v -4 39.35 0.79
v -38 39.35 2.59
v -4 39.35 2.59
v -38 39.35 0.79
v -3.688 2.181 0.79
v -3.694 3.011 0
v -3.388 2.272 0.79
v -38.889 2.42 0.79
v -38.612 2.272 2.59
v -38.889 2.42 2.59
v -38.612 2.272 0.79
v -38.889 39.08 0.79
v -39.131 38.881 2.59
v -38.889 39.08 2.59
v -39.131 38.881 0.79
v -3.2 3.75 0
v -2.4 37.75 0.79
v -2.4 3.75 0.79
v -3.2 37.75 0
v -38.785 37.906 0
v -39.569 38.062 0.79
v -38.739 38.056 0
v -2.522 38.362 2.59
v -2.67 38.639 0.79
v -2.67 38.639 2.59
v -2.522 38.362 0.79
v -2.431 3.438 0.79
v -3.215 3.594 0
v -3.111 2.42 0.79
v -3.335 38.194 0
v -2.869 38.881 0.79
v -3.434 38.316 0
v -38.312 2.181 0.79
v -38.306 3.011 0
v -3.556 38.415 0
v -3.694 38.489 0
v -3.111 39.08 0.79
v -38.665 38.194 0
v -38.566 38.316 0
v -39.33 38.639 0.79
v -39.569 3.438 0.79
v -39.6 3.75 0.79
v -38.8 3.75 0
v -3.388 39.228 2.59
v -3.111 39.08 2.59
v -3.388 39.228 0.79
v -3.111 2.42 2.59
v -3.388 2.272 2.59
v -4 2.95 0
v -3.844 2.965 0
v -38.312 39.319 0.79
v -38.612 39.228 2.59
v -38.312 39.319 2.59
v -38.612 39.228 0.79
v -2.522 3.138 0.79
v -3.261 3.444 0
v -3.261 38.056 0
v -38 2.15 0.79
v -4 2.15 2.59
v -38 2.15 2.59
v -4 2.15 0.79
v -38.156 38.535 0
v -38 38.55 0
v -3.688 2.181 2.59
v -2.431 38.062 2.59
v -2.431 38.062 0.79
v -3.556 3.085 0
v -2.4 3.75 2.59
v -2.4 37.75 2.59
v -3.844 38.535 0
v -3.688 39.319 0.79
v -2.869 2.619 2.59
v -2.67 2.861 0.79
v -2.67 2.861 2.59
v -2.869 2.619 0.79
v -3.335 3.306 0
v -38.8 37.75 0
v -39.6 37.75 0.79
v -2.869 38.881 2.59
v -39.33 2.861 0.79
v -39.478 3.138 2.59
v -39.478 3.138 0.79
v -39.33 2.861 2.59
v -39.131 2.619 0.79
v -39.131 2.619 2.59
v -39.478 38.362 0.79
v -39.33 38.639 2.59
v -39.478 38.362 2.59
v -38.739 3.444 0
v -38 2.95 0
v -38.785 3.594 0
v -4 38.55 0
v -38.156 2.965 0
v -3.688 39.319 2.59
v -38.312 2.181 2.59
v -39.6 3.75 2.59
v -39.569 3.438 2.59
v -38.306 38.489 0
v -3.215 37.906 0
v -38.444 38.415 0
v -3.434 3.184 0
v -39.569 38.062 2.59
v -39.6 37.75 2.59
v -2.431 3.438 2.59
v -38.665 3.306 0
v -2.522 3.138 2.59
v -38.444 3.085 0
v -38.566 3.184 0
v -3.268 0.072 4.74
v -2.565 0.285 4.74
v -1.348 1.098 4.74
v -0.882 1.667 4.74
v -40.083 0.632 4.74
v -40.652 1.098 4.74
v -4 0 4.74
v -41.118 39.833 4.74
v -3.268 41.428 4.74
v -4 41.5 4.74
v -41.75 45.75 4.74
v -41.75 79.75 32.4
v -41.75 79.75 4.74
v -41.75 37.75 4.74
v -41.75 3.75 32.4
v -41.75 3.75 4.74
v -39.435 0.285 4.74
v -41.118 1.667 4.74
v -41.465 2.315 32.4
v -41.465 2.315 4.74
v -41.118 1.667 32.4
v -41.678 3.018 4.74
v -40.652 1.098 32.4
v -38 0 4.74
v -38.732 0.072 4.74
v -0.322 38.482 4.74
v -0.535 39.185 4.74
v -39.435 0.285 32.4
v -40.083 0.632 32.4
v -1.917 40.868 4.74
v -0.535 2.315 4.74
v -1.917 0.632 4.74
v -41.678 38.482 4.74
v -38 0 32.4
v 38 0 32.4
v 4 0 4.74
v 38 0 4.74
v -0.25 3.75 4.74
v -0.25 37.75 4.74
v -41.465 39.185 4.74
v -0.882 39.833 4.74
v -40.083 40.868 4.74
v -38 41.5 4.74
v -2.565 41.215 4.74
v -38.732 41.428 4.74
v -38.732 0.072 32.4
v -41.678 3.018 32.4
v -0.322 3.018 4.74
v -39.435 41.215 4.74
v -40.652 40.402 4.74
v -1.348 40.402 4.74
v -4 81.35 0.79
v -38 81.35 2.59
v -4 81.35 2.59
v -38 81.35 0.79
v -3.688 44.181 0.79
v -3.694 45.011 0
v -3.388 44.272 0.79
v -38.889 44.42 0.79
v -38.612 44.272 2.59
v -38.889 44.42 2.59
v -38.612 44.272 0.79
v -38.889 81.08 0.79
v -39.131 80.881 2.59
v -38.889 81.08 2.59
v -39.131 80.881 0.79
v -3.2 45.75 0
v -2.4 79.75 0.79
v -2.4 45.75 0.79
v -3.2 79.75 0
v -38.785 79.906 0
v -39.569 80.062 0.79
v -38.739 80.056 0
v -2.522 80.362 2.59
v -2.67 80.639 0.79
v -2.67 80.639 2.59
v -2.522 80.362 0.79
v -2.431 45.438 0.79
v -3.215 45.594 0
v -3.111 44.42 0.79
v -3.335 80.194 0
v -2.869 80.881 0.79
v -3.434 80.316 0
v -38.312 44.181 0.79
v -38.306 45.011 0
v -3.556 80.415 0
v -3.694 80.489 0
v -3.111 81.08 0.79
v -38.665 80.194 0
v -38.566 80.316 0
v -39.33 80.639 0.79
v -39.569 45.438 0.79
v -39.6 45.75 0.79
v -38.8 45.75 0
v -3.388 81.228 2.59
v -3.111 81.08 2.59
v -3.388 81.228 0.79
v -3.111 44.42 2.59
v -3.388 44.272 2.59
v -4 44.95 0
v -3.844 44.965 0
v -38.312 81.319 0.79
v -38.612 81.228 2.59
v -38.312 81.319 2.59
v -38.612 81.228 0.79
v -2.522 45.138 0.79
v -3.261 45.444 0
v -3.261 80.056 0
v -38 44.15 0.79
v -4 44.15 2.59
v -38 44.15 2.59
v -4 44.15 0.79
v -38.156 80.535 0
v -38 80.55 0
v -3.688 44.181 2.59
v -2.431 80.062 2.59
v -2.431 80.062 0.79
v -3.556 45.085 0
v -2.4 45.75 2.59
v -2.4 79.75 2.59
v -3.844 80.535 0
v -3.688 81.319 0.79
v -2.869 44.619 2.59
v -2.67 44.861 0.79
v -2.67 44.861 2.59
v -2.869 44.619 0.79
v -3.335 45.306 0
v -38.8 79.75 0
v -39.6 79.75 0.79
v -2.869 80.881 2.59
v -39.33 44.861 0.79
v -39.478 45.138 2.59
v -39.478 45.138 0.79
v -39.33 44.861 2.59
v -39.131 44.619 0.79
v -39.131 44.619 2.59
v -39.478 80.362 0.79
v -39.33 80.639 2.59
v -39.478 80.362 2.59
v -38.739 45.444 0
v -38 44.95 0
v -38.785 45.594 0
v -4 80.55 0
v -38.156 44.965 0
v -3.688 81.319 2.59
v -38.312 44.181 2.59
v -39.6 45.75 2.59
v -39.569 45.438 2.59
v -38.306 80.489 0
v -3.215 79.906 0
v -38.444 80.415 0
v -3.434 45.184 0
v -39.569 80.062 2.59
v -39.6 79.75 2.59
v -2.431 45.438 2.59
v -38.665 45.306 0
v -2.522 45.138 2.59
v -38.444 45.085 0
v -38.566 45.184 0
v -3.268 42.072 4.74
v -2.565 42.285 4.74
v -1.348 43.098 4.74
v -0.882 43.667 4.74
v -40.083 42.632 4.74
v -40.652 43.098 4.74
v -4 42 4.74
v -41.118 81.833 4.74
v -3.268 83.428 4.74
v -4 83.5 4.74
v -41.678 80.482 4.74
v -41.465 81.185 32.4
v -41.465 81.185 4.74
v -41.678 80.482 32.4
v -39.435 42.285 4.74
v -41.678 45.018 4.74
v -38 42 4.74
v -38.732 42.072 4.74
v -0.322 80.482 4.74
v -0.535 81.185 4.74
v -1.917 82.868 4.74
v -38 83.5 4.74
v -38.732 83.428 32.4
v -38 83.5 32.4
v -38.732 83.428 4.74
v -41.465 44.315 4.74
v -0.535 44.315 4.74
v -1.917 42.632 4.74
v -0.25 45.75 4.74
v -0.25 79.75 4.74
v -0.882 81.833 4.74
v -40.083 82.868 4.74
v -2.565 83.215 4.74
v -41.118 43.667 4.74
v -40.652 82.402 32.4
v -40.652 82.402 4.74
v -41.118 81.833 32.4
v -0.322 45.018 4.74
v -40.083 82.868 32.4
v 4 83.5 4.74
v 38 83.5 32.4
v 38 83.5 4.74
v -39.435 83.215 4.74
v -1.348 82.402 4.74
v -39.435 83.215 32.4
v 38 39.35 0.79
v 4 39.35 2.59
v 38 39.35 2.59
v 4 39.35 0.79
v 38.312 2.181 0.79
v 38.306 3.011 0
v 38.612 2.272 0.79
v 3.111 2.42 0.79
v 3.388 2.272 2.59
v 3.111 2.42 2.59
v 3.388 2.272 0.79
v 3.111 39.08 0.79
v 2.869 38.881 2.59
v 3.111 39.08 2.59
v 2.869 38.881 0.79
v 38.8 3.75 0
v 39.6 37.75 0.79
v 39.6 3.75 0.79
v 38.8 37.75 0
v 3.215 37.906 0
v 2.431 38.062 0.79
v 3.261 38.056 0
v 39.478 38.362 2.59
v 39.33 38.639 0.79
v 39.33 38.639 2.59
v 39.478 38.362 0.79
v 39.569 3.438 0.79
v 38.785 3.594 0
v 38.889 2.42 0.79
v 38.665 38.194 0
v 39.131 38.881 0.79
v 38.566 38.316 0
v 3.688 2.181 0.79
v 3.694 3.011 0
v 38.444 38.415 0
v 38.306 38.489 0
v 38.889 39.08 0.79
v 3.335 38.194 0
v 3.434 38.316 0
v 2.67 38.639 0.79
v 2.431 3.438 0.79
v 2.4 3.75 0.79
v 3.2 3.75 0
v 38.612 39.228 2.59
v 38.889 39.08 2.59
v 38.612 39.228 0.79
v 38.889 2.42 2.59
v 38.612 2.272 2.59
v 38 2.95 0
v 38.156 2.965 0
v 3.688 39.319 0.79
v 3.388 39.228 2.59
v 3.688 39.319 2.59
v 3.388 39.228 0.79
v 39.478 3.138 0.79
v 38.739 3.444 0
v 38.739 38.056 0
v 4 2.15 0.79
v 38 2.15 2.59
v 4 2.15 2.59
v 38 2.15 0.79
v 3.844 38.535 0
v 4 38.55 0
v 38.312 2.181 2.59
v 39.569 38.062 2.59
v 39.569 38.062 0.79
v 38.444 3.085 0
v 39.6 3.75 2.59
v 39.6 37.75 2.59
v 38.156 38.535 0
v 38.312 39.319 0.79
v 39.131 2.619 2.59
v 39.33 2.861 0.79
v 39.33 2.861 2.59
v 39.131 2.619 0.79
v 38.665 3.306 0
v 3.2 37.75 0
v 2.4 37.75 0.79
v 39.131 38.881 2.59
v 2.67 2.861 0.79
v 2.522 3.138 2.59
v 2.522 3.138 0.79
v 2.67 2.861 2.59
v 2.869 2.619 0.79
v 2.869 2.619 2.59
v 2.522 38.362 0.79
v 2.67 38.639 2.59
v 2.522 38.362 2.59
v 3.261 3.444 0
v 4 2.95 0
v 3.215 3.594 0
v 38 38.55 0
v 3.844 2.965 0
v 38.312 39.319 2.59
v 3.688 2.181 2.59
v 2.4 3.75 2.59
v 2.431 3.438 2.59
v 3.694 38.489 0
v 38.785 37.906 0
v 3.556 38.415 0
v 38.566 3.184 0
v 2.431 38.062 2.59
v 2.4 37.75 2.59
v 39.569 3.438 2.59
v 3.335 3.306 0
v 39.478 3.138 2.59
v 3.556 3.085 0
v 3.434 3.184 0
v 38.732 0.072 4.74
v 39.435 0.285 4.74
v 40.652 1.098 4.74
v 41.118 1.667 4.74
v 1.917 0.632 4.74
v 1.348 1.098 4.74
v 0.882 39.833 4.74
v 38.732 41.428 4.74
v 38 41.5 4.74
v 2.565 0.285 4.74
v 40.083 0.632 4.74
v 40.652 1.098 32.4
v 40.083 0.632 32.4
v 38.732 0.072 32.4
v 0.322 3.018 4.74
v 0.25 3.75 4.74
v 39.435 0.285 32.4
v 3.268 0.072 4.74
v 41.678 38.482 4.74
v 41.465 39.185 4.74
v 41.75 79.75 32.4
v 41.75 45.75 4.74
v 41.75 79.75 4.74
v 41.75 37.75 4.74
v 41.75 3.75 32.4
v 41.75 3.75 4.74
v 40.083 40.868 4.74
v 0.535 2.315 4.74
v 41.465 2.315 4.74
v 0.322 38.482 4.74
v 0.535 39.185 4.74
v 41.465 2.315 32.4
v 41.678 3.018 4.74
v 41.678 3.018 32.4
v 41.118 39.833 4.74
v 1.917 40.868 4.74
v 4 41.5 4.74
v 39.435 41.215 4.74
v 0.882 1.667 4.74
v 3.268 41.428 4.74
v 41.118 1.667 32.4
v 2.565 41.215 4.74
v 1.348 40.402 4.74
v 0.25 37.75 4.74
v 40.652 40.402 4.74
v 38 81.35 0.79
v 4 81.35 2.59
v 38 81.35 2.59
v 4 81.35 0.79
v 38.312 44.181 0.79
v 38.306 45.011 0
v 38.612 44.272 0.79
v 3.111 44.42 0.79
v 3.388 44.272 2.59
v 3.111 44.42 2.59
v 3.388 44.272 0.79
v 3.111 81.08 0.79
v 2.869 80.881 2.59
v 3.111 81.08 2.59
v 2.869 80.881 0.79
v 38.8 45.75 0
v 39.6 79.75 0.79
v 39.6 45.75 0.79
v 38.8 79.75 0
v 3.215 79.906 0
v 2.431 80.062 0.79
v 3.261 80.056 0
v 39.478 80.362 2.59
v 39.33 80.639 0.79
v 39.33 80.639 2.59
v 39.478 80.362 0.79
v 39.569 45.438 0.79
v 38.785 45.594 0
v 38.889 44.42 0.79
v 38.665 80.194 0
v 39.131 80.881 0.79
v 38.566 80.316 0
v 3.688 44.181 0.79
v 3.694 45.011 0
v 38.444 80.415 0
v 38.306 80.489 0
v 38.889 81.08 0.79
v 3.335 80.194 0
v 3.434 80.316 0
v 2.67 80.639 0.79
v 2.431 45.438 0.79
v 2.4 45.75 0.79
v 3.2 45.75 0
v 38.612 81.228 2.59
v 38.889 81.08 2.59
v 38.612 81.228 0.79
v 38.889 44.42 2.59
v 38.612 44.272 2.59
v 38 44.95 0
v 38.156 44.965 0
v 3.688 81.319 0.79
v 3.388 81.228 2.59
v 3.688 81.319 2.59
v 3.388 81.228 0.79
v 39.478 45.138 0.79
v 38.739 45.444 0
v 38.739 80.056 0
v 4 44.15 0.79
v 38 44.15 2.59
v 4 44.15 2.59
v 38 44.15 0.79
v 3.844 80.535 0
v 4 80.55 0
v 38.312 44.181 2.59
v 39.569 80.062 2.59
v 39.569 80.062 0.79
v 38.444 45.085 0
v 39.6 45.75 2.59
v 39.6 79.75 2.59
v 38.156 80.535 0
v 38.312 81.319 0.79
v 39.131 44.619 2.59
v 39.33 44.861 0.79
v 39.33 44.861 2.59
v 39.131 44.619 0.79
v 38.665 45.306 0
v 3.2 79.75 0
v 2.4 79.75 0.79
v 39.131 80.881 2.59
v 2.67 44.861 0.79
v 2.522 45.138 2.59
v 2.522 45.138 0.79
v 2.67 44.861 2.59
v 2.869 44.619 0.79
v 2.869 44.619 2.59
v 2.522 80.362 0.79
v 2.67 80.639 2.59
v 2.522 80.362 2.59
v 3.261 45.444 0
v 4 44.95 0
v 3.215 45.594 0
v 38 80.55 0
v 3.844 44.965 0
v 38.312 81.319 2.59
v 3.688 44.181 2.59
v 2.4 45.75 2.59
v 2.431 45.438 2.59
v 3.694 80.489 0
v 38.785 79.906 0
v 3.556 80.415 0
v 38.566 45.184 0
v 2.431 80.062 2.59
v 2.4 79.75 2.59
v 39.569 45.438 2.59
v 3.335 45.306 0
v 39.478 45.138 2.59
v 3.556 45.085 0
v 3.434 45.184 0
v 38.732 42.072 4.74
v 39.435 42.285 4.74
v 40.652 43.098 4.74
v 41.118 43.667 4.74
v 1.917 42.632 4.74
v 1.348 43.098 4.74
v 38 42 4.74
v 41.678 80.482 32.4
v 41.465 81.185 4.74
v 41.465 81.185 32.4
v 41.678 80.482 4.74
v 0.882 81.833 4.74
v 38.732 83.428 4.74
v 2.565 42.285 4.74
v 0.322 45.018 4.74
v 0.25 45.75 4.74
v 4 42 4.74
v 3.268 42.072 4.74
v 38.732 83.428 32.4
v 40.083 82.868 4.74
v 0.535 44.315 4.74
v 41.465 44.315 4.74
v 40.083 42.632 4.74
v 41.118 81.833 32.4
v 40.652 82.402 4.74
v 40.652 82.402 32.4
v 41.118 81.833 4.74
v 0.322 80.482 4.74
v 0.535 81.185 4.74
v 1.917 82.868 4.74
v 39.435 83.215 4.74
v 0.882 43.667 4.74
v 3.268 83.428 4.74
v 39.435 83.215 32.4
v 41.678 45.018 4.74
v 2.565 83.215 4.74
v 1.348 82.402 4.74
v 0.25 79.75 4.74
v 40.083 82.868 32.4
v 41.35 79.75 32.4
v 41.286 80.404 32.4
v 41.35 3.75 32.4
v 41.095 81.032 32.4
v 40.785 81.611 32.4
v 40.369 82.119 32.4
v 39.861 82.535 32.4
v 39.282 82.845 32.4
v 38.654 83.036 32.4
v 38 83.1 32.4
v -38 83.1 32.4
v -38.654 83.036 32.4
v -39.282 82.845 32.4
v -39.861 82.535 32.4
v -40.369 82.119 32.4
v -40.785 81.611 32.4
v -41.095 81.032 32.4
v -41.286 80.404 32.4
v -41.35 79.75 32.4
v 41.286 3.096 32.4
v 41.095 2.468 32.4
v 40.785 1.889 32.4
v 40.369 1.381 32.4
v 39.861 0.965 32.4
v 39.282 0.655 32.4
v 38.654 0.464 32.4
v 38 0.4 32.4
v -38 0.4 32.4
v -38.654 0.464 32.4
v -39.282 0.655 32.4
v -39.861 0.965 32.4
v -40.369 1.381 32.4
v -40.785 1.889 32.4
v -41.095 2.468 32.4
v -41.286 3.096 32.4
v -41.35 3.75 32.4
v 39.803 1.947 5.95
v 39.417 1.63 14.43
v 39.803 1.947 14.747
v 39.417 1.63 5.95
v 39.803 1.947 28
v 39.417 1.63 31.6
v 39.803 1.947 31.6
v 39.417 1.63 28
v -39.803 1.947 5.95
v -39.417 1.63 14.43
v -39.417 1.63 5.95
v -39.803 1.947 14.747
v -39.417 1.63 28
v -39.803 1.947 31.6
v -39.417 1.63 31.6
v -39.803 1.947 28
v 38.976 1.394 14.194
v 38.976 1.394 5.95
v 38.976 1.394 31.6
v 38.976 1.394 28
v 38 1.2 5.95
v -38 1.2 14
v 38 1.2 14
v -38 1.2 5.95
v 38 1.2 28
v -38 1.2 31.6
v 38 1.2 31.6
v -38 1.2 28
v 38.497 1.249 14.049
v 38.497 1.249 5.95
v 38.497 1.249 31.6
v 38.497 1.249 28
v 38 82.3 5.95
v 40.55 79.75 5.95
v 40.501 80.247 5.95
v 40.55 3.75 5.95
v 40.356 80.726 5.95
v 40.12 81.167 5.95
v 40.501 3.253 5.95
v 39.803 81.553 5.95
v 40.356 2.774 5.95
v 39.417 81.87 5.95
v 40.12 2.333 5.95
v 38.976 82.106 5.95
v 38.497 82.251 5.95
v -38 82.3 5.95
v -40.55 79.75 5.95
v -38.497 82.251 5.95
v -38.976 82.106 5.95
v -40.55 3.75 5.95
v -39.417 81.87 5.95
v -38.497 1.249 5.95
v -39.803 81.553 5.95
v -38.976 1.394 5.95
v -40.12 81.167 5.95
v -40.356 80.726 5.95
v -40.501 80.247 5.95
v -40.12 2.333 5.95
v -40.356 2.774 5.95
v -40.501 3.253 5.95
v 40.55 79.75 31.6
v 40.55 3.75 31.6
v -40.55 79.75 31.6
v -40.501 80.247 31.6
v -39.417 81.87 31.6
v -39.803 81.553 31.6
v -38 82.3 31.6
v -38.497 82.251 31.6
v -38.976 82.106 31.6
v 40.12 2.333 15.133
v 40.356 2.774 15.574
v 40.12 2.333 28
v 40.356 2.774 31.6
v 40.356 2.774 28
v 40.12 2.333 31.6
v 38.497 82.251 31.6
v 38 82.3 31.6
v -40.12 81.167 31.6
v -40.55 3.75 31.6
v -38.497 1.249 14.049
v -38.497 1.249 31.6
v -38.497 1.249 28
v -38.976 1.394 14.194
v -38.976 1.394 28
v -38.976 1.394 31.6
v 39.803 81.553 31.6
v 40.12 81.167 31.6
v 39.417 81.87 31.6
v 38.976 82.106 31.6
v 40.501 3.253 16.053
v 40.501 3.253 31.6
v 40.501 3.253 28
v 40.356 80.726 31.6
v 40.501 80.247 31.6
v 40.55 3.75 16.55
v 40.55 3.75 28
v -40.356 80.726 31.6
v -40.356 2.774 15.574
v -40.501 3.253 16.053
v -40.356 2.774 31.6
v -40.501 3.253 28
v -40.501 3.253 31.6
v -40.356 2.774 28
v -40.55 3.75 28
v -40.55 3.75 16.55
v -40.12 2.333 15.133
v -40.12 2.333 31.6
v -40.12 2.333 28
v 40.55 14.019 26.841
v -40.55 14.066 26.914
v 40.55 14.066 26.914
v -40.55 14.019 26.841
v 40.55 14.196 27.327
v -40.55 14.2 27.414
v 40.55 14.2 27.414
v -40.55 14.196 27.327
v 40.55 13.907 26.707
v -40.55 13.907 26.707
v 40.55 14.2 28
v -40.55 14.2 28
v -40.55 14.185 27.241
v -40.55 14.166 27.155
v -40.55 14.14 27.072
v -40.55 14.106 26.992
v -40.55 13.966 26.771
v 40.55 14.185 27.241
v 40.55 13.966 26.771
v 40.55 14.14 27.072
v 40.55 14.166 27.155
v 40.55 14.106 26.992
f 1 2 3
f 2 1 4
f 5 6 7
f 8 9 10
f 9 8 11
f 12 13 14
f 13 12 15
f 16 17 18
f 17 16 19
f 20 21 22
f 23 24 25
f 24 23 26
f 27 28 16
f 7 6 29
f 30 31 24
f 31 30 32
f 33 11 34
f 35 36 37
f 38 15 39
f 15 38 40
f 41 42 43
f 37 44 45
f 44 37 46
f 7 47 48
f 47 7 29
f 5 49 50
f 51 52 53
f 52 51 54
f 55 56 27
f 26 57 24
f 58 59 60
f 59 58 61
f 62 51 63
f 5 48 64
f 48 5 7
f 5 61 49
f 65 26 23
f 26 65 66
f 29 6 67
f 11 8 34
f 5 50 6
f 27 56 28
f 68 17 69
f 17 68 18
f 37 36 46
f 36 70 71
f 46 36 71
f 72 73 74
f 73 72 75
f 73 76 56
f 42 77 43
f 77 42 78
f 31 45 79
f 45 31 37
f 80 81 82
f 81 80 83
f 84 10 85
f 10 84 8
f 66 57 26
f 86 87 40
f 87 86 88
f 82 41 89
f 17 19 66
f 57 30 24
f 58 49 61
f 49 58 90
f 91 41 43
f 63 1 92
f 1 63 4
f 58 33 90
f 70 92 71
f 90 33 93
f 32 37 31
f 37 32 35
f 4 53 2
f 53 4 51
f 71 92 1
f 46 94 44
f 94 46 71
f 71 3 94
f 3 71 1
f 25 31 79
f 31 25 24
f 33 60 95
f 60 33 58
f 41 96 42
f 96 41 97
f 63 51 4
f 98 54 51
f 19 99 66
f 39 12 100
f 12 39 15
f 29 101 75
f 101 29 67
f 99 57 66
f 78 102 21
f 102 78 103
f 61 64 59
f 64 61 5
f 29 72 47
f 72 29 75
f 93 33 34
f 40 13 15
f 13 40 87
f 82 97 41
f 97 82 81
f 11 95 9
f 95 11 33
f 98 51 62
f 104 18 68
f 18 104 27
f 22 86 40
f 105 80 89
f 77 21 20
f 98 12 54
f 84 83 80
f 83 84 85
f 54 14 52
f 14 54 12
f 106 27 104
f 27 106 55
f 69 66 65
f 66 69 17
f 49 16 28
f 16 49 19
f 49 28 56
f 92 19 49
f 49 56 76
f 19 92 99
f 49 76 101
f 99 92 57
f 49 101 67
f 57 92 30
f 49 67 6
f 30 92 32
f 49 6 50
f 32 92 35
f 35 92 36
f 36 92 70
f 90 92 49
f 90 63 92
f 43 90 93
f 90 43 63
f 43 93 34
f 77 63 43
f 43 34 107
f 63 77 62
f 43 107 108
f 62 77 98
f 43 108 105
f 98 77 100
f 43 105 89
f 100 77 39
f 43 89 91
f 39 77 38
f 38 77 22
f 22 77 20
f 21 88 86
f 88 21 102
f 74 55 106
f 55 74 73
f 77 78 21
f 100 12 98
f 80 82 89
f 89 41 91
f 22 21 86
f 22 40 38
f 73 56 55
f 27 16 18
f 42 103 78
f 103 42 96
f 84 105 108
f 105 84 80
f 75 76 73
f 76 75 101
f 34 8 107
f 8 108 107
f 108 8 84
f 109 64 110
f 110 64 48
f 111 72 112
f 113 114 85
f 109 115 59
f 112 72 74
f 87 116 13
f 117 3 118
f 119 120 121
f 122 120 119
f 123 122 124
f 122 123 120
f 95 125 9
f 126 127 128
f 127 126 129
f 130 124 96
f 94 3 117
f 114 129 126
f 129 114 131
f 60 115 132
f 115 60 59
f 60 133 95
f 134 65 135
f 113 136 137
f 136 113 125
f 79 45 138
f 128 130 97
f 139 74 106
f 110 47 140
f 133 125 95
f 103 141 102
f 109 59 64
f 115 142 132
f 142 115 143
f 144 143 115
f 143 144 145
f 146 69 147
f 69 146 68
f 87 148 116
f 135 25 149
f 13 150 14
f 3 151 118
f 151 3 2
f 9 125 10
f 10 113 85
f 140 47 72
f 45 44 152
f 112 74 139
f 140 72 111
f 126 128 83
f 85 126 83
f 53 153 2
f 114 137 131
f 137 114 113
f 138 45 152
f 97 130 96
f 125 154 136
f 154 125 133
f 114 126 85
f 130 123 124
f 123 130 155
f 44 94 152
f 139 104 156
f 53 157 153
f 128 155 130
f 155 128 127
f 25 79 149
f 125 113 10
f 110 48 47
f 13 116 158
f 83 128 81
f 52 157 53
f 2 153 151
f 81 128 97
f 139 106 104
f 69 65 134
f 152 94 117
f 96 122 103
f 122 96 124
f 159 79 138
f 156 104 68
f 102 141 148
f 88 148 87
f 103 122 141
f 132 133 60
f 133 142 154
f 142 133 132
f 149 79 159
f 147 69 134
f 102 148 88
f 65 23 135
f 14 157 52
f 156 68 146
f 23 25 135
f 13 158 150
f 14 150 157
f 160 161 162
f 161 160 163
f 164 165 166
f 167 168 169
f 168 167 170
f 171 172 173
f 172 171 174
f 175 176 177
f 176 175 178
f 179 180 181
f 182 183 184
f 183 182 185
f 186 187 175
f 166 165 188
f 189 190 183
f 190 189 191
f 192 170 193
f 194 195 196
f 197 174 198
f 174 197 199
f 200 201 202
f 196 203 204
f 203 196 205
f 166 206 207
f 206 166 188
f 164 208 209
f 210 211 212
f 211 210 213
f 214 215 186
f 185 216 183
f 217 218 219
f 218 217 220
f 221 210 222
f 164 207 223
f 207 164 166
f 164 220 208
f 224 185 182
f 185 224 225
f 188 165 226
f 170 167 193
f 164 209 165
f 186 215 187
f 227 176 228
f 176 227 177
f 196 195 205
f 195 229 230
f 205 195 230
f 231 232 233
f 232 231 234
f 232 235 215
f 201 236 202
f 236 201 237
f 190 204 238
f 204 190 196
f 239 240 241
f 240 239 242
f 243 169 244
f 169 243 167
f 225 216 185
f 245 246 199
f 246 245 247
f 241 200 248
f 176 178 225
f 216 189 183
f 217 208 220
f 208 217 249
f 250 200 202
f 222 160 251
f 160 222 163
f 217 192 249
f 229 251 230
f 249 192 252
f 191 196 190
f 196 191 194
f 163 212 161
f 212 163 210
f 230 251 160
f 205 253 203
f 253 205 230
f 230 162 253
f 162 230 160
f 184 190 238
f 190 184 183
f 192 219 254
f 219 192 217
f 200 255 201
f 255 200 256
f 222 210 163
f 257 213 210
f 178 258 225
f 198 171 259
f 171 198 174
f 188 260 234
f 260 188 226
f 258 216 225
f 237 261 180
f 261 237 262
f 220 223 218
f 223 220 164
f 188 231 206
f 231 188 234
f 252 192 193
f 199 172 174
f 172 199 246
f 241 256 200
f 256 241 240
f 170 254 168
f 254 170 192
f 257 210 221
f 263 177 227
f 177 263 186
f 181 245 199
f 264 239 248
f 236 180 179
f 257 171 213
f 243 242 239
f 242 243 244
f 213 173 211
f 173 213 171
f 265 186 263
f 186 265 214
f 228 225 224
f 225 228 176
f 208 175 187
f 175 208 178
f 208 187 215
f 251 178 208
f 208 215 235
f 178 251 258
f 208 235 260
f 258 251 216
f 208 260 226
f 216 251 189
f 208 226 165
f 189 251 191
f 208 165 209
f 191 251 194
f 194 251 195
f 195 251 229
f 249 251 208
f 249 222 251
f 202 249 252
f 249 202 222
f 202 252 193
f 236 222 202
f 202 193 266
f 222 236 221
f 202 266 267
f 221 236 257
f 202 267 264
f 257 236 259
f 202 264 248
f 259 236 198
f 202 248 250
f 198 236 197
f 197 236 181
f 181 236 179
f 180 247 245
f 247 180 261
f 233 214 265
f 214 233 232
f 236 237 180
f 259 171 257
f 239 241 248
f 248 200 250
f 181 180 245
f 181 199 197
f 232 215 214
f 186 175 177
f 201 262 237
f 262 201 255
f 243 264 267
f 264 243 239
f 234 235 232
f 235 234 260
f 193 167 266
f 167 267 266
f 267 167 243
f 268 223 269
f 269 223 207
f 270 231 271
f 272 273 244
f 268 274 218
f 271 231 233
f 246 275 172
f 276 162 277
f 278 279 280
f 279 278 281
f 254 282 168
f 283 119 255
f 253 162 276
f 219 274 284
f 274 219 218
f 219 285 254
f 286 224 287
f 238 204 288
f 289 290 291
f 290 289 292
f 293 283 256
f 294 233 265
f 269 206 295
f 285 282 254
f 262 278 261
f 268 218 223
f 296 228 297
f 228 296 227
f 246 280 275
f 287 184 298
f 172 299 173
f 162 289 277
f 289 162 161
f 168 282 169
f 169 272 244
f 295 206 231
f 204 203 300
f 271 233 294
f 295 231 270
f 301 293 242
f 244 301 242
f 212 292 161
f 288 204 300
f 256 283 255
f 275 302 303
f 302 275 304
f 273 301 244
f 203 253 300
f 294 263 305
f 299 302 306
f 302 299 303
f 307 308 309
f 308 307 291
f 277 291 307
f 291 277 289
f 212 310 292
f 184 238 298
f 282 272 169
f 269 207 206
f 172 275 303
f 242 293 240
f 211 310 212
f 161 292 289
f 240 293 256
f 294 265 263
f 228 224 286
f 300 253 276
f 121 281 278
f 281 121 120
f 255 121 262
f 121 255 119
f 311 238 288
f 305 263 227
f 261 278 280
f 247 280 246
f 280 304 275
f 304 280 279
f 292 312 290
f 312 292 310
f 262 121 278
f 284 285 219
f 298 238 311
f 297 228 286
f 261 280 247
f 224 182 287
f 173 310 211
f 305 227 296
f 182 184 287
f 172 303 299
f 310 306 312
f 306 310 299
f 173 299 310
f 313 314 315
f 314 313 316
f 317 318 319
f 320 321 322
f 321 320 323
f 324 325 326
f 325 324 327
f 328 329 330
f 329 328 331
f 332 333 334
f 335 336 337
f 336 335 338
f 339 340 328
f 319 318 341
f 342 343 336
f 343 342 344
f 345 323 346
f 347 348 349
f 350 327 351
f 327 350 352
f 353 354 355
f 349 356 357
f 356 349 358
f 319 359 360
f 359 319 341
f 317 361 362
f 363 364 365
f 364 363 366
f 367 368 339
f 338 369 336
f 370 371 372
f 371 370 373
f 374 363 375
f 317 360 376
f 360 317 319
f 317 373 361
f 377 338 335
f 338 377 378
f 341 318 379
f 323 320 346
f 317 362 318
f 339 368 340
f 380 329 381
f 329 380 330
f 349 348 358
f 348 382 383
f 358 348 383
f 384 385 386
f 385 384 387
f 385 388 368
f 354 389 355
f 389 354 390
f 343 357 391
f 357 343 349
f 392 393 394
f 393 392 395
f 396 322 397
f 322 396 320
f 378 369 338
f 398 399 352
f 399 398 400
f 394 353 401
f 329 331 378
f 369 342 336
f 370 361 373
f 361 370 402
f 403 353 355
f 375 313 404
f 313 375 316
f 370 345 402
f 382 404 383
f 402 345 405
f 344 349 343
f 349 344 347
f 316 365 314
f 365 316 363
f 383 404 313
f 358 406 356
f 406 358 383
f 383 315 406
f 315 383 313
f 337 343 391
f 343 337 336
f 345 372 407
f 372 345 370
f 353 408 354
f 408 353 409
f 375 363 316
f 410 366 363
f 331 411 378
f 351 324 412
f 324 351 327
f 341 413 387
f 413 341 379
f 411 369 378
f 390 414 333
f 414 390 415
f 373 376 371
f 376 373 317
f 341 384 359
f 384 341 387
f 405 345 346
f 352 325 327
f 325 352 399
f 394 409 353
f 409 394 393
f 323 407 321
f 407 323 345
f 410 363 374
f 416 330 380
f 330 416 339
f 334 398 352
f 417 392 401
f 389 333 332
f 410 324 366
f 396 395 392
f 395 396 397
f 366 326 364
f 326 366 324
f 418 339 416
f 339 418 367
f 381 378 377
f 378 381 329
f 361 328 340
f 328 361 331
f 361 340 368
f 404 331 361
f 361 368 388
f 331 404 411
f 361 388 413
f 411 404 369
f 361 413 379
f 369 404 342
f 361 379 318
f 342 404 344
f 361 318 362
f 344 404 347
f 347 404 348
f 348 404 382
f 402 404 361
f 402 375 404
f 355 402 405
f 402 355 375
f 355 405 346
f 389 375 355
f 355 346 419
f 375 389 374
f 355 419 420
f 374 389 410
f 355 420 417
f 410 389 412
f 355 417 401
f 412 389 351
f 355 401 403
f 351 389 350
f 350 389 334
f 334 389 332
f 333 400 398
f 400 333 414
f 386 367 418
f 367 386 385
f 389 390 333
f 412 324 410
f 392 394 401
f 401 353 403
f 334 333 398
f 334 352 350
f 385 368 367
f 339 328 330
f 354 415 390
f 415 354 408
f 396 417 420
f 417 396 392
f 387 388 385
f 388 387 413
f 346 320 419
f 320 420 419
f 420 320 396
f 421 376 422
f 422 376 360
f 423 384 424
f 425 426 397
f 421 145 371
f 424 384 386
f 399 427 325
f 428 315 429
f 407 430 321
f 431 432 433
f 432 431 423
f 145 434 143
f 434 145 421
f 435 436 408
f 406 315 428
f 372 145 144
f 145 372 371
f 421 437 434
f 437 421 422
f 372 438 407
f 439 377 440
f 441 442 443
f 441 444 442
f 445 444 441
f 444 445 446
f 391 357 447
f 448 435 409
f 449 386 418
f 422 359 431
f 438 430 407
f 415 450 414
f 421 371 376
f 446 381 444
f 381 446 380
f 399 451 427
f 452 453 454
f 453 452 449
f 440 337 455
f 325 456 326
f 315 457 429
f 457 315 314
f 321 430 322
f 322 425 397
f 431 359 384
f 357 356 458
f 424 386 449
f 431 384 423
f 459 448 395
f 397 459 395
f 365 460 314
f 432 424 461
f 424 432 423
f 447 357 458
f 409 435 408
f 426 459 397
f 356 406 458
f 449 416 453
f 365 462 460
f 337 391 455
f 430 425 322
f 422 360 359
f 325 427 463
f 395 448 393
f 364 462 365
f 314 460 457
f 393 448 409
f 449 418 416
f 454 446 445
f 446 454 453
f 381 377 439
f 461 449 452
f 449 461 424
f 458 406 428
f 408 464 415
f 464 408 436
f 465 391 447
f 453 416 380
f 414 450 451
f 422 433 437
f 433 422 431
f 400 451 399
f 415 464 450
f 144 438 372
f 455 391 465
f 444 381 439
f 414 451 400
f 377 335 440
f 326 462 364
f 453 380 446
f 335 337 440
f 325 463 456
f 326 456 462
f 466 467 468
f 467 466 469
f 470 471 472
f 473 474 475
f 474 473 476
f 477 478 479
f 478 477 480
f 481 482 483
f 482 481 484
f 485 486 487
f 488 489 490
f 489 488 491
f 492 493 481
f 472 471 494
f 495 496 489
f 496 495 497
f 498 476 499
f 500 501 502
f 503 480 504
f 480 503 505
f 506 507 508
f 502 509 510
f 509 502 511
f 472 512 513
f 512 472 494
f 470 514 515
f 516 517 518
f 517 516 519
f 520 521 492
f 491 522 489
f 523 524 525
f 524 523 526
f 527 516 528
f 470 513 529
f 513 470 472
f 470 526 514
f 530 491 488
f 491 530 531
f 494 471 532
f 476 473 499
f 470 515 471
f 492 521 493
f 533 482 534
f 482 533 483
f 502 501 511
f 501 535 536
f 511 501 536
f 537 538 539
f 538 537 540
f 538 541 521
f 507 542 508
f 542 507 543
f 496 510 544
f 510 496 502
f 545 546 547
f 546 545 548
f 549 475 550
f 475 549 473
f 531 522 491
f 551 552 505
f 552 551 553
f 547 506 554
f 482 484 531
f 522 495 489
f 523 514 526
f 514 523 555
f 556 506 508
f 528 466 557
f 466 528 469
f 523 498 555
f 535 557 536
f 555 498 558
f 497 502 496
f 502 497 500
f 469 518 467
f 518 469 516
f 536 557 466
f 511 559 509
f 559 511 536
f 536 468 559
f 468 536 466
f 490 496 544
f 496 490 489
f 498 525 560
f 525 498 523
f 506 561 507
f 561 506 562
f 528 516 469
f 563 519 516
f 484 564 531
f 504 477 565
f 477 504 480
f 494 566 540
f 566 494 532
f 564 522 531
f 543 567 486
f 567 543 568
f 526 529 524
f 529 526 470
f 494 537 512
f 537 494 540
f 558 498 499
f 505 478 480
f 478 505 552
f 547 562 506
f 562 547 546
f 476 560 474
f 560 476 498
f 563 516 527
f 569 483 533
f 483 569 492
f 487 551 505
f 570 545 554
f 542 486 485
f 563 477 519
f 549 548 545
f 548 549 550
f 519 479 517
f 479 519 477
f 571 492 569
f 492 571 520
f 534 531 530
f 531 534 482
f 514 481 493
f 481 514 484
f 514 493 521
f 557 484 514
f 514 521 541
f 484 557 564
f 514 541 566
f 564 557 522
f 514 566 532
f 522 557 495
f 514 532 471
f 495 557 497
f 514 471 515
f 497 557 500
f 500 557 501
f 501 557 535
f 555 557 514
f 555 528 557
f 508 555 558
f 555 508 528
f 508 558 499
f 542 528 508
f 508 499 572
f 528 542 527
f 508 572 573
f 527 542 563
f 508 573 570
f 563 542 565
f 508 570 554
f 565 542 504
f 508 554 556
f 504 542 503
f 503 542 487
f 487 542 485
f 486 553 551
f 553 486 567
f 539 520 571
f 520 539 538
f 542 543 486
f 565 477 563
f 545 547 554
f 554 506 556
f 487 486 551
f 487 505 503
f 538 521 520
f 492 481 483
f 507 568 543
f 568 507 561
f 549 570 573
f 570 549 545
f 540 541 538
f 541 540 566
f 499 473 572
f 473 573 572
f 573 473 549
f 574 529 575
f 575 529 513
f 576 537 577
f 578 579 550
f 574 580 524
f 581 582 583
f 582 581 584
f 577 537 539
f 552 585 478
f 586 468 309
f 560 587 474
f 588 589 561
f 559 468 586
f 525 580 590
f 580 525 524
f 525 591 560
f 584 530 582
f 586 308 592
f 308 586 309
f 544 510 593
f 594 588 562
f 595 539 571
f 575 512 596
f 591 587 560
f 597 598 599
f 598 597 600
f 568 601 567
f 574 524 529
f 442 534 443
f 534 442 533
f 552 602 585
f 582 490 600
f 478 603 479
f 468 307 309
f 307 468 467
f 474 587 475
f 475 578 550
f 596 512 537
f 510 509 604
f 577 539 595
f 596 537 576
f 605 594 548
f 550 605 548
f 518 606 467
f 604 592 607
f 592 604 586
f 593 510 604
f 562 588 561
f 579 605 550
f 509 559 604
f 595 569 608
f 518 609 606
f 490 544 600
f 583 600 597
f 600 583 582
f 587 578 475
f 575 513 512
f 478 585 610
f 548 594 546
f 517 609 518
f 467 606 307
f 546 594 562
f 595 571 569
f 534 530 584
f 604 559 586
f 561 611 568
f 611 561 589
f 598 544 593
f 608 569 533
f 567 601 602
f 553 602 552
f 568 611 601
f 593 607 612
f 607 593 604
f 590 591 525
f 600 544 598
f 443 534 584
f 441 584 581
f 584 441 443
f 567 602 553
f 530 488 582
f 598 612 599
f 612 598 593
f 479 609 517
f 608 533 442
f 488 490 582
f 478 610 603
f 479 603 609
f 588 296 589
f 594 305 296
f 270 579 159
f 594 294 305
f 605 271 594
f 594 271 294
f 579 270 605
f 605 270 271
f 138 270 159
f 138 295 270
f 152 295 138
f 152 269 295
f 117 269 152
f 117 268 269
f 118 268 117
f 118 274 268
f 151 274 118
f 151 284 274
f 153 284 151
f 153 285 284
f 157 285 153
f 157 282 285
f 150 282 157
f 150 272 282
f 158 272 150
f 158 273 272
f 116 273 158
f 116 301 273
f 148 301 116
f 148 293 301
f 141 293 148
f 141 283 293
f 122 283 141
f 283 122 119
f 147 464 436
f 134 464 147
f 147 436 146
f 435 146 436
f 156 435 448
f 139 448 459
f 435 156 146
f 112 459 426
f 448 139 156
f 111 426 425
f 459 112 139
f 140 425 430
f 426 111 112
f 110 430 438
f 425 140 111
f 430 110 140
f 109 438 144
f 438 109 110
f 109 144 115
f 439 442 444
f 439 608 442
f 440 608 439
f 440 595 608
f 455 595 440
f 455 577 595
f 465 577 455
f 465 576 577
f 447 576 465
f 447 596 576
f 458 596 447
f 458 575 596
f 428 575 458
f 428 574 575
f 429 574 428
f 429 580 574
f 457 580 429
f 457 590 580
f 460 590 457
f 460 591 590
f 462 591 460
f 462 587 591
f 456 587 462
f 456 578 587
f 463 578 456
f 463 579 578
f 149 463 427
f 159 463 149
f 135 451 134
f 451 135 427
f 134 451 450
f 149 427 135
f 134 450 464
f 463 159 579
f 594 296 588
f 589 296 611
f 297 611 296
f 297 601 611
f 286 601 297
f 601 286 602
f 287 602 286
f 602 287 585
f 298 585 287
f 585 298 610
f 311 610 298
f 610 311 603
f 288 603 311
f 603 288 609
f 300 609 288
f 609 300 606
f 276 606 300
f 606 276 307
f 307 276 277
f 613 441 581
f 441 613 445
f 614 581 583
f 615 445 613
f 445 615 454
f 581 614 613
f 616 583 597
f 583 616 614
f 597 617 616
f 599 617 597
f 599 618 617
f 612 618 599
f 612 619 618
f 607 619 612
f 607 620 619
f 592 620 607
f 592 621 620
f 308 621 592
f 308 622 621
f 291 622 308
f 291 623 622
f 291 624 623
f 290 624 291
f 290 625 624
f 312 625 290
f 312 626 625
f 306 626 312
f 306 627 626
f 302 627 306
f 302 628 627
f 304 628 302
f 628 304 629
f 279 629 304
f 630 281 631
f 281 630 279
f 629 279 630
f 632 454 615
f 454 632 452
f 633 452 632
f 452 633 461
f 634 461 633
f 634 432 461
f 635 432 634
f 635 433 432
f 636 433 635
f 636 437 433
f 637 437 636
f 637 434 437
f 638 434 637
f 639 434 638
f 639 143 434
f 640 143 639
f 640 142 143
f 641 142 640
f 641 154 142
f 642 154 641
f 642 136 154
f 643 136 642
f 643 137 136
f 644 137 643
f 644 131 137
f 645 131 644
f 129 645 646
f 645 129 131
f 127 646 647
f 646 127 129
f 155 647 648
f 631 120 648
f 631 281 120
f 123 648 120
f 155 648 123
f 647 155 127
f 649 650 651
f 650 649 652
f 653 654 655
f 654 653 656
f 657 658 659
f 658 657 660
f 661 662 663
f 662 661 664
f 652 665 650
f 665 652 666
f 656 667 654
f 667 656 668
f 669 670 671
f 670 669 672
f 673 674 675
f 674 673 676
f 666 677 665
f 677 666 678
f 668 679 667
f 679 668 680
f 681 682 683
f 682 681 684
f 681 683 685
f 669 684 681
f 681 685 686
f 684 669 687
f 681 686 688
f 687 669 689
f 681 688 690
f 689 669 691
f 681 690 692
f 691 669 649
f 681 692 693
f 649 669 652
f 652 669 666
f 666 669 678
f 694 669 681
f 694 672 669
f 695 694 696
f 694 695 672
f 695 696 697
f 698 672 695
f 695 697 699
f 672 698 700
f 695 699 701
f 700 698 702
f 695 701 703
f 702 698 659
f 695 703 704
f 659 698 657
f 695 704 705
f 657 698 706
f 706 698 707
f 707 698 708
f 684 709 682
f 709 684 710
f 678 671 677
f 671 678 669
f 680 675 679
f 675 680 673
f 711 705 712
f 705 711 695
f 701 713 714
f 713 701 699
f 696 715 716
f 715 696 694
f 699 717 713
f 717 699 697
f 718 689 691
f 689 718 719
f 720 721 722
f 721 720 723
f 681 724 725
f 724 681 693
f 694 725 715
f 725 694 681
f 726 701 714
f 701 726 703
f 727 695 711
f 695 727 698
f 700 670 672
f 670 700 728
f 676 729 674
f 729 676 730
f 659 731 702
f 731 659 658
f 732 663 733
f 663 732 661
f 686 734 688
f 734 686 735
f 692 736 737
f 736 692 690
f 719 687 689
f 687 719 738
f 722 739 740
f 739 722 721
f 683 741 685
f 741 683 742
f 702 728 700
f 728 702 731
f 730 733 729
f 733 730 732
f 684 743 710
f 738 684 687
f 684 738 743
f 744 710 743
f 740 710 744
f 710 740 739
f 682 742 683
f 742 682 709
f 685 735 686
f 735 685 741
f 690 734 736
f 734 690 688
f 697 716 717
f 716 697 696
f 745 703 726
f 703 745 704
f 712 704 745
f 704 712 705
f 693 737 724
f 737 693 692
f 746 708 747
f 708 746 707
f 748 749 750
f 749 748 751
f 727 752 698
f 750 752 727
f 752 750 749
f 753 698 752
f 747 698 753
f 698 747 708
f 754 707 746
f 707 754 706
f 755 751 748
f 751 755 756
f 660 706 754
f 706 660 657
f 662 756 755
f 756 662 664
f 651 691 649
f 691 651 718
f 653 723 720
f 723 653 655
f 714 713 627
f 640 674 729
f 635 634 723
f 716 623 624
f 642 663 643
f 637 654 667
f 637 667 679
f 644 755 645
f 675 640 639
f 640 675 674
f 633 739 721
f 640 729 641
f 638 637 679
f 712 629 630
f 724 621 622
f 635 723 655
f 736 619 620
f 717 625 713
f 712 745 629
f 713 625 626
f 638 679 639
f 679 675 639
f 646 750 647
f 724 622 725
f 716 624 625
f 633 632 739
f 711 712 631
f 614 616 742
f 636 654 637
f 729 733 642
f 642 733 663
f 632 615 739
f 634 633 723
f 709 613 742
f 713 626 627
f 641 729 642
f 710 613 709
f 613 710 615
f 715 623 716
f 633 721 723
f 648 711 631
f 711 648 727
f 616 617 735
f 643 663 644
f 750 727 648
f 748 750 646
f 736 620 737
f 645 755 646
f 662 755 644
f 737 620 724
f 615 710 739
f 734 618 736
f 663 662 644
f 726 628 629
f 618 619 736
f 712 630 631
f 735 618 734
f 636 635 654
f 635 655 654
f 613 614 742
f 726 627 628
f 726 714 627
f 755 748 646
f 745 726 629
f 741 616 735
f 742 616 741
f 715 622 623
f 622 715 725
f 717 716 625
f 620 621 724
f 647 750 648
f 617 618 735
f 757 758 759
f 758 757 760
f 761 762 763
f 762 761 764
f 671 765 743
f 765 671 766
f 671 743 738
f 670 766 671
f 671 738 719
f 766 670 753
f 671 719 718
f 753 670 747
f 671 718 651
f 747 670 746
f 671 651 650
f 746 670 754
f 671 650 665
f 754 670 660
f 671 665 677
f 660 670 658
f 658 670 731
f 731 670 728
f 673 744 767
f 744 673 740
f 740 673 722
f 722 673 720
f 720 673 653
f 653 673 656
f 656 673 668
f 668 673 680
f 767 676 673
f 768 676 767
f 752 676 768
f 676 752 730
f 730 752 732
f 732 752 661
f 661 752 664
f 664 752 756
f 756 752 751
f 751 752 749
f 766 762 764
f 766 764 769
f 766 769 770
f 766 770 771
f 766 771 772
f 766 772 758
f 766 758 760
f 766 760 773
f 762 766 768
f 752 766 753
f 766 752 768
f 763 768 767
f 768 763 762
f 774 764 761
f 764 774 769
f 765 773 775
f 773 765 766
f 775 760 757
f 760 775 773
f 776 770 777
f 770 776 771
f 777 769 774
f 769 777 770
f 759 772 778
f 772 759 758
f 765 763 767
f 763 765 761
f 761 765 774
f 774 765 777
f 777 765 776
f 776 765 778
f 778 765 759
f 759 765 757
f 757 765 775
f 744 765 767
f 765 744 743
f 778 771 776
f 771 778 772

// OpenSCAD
// file: ../../../modules/gridfinity.scad
// Gridfinity ベースプレートの共有 module。
// 寸法は Gridfinity 仕様 (Zack Freedman) の baseplate 輪郭に従う:
//   ピッチ 42、ソケット上端開口 41.5 (角 R4)、上から 45° 面取り 2.15 →
//   垂直 1.8 (37.2 角・R1.85) → 45° 面取り 0.7 → 底 35.8 角 (R1.15)。
//   ソケット深さ = 2.15 + 1.8 + 0.7 = 4.65。
//
// 座標系: X が列方向 (中央が 0)、Y が行方向 (板の前端が 0)、Z=0 が板の底面。
// 板の外形は grid とは独立に rim で与えるので、grid より大きい板 (縁付き) を
// 作れる。ソケットは rim=[left, right, front, back] の内側へ 42 ピッチで並ぶ。

gf_pitch = 42;
gf_socket_top = 41.5; // 上端開口
gf_socket_mid = 37.2; // 垂直部
gf_socket_bot = 35.8; // 底
gf_socket_r_top = 4;
gf_socket_r_mid = 1.85;
gf_socket_r_bot = 1.15;
gf_chamfer_top = 2.15;
gf_wall_h = 1.8;
gf_chamfer_bot = 0.7;
gf_socket_depth = gf_chamfer_top + gf_wall_h + gf_chamfer_bot; // 4.65
gf_fn = 32;
gf_eps = 0.01; // hull 用の薄板の厚さ
gf_over = 0.5; // 切削の抜き代

// 角丸正方形または矩形 (w は一辺、または [幅, 奥行き]、角 R)
module
gf_rounded_square(w, r)
{
    offset(r = r, $fn = gf_fn)
        square(is_list(w) ? w - [ 2 * r, 2 * r ] : w - 2 * r, center = true);
}

// 厚さ gf_eps の角丸正方形の薄板を z に置く (hull の骨)
module
gf_slab(w, r, z)
{
    translate([ 0, 0, z ]) linear_extrude(gf_eps) gf_rounded_square(w, r);
}

// ソケット1個の切削体。z=0 がソケットの底 (床の天面)、+Z へ 4.65 で天面に出る。
// clearance は嵌合の逃げで、輪郭を全周へ clearance だけ外へ出す (幅 +2c、角 R
// +c)。pitch_x は X 方向のセル幅。端数でも角 R と面取りの寸法を保つ。
module
gf_socket_cut(clearance = 0, pitch_x = gf_pitch)
{
    z1 = gf_chamfer_bot;
    z2 = z1 + gf_wall_h;
    z3 = gf_socket_depth;
    c = clearance;
    assert(pitch_x > gf_pitch - gf_socket_top + 2 * gf_socket_r_top,
           "Cell width is too small for the socket corner radius");
    delta = [ pitch_x - gf_pitch, 0 ];
    bot = [ gf_socket_bot + 2 * c, gf_socket_bot + 2 * c ] + delta;
    mid = [ gf_socket_mid + 2 * c, gf_socket_mid + 2 * c ] + delta;
    top = [ gf_socket_top + 2 * c, gf_socket_top + 2 * c ] + delta;
    hull()
    {
        gf_slab(bot, gf_socket_r_bot + c, 0);
        gf_slab(mid, gf_socket_r_mid + c, z1 - gf_eps);
    }
    hull()
    {
        gf_slab(mid, gf_socket_r_mid + c, z1 - gf_eps);
        gf_slab(mid, gf_socket_r_mid + c, z2 - gf_eps);
    }
    hull()
    {
        gf_slab(mid, gf_socket_r_mid + c, z2 - gf_eps);
        gf_slab(top, gf_socket_r_top + c, z3 - gf_eps);
    }
    // 天面より上へ抜く (天面と同一平面の退化した面を残さない)
    gf_slab(top, gf_socket_r_top + c, z3 - gf_eps);
    translate([ 0, 0, z3 - gf_eps ]) linear_extrude(gf_over + gf_eps)
        gf_rounded_square(top, gf_socket_r_top + c);
}

// ベースプレート。cols x rows のソケットを床 floor_t の上に彫る。
// rim = [left, right, front, back] はソケット列の外側に残す縁の幅。
// 板の幅 = cols*42 + left + right、奥行き = rows*42 + front + back。
// cols の端数は左端の細幅セルになる。rows は正の整数。
// clearance はソケットの嵌合の逃げ (gf_socket_cut を参照)。
module
gf_baseplate(cols, rows, rim = [ 0, 0, 0, 0 ], floor_t = 1, clearance = 0)
{
    grid_w = cols * gf_pitch;
    grid_d = rows * gf_pitch;
    plate_w = grid_w + rim[0] + rim[1];
    plate_d = grid_d + rim[2] + rim[3];
    x0 = -plate_w / 2 + rim[0]; // ソケット列の左端
    first_pitch = grid_w - (ceil(cols) - 1) * gf_pitch;
    difference()
    {
        translate([ -plate_w / 2, 0, 0 ])
            cube([ plate_w, plate_d, floor_t + gf_socket_depth ]);
        for (c = [0:ceil(cols) - 1], r = [0:rows - 1])
            translate([
                x0 + (c == 0 ? first_pitch / 2
                             : first_pitch + (c - 0.5) * gf_pitch),
                rim[2] + (r + 0.5) * gf_pitch,
                floor_t
            ]) gf_socket_cut(clearance, c == 0 ? first_pitch : gf_pitch);
    }
}
// file: ../../../modules/gridfinity_bins.scad
include <gridfinity_bin.scad>

// assets/gridfinity-bin/ の bin 群の共通値と、サイズ 3 引数の払い出し口。
// 単体では何も描かない。設計の経緯と確定値は
// ledger/designs/gridfinity-bin-4u.md が正本。
// 通常binは4U/9U、X={1,1.5,2,2.5,3} × Y={1,2,3,4,5,5.5}。
// 両軸に端数を持つ組み合わせはassetに置かない（各高さ28種）。
// Xが横、Yがラベルの壁から奥、unitsが高さ（7mm単位）。
wall = 1.2;    // 0.4 ノズル 3 本
floor_t = 1.2; // 底 (4.75) の上に載せる床。床の天面 z = 5.95
label_d = 13;  // 12mm 幅のラベルシールを貼る天板の張り出し
label_t = 1; // 天板の厚さ (user 指定)。下は 45° の無垢のくさび
label_r = 1; // 天板の先端と 45° 面の境目の R (user 指定)
// カードケース (goods/card_case_2x3x4u.scad) の値。カードは ISO/IEC 7810 ID-1 (85.6 × 54 ×
// 0.76、隅 R3) で、長辺を Y (rows 方向) に寝かせ、X 中央・手前の壁から 10 奥に置く。ポケットは
// カードより 1 大きい (片側 0.5)。右奥のマスは壁の内面まで抜き、床と底を外形に平行な 45° の窪みにする。
// ポケットの左右の埋めの天面 (幅 13.05) が 12mm のラベルを貼る帯。ポケットと穴の交点の
// 縦エッジは丸める (開口の上縁は丸めない: 壁を上端まで垂直に保ち、収まる枚数を減らさない)
card_w = 54;    // カードの短辺 (X)。user 指定「高さ 54」
card_d = 85.6;  // カードの長辺 (Y)。user 指定「幅 85.6」
card_clear = 1; // ポケットの余裕 (user 指定「+1mm」)
// ポケットの手前の辺の、手前の壁の内面からの距離 (user 指定「10mm」)
card_off = 10;
// ポケットの平面の隅 R (user 指定「角の丸み 3mm」。ID-1 の隅は 2.88..3.48)
card_r = 3;
// ポケットと穴が交わる所の、埋めの凸の縦エッジの R (指の当たる角)
card_edge_r = 2;
recess_skin = floor_t + 1.75; // 窪みの床 z (底の皮)。user 指定「壁厚と同じ 1.2 は過剰、1.75 返す」

function bin_contract(cols, rows, units) = str("CONTRACT units=",
                                               units,
                                               " pitch=",
                                               gf_pitch,
                                               " outer=",
                                               gfb_outer,
                                               " h=",
                                               units* gfb_unit,
                                               " lip=",
                                               gfb_lip_h,
                                               " base=",
                                               gfb_base_bot,
                                               "/",
                                               gfb_base_mid,
                                               "/",
                                               gfb_outer,
                                               " base_h=",
                                               gfb_base_h,
                                               " wall=",
                                               wall,
                                               " floor_top=",
                                               gfb_base_h + floor_t,
                                               " label=",
                                               label_d,
                                               "x",
                                               label_t,
                                               " wedge=45 fillet=",
                                               label_r,
                                               " bin=",
                                               cols,
                                               "x",
                                               rows,
                                               " size=",
                                               cols* gf_pitch - 0.5,
                                               "x",
                                               rows* gf_pitch - 0.5);

// (cols, rows, units) でラベル付き bin を払い出す。例: gridfinity_bin(2, 4, 4)
module
gridfinity_bin(cols, rows, units = 4)
{
    echo(bin_contract(cols, rows, units));
    gfb_bin(cols, rows, units, wall, floor_t, label_d, label_t, label_r);
}

function card_contract(cols, rows, units) = str("CONTRACT card units=",
                                                units,
                                                " bin=",
                                                cols,
                                                "x",
                                                rows,
                                                " size=",
                                                cols* gf_pitch - 0.5,
                                                "x",
                                                rows* gf_pitch - 0.5,
                                                " h=",
                                                units* gfb_unit,
                                                " lip=",
                                                gfb_lip_h,
                                                " floor_top=",
                                                gfb_base_h + floor_t,
                                                " card=",
                                                card_w,
                                                "x",
                                                card_d,
                                                " pocket=",
                                                card_w + card_clear,
                                                "x",
                                                card_d + card_clear,
                                                " at=",
                                                -(card_w + card_clear) / 2,
                                                ",",
                                                wall + card_off,
                                                " hole=",
                                                (cols - 1) / 2 * gf_pitch - gfb_outer / 2,
                                                ",",
                                                (rows - 0.5) * gf_pitch - 0.25 - gfb_outer / 2,
                                                " hole_r=",
                                                gfb_outer_r - wall,
                                                " recess=",
                                                gfb_outer - 2 * wall,
                                                "/",
                                                gfb_base_mid - 2 * wall,
                                                " recess_floor=",
                                                recess_skin,
                                                " r=",
                                                card_r,
                                                " edge_r=",
                                                card_edge_r);

// (cols, rows, units) でカードケースを払い出す。例: gridfinity_card_case(2, 3, 4)
module
gridfinity_card_case(cols, rows, units = 4)
{
    echo(card_contract(cols, rows, units));
    gfb_card_case(cols,
                  rows,
                  units,
                  wall,
                  floor_t,
                  [ card_w, card_d ],
                  card_clear,
                  card_off,
                  card_r,
                  recess_skin,
                  card_edge_r);
}
// main file
include <../../../modules/gridfinity_bins.scad>

gridfinity_bin(2, 2, 4);
